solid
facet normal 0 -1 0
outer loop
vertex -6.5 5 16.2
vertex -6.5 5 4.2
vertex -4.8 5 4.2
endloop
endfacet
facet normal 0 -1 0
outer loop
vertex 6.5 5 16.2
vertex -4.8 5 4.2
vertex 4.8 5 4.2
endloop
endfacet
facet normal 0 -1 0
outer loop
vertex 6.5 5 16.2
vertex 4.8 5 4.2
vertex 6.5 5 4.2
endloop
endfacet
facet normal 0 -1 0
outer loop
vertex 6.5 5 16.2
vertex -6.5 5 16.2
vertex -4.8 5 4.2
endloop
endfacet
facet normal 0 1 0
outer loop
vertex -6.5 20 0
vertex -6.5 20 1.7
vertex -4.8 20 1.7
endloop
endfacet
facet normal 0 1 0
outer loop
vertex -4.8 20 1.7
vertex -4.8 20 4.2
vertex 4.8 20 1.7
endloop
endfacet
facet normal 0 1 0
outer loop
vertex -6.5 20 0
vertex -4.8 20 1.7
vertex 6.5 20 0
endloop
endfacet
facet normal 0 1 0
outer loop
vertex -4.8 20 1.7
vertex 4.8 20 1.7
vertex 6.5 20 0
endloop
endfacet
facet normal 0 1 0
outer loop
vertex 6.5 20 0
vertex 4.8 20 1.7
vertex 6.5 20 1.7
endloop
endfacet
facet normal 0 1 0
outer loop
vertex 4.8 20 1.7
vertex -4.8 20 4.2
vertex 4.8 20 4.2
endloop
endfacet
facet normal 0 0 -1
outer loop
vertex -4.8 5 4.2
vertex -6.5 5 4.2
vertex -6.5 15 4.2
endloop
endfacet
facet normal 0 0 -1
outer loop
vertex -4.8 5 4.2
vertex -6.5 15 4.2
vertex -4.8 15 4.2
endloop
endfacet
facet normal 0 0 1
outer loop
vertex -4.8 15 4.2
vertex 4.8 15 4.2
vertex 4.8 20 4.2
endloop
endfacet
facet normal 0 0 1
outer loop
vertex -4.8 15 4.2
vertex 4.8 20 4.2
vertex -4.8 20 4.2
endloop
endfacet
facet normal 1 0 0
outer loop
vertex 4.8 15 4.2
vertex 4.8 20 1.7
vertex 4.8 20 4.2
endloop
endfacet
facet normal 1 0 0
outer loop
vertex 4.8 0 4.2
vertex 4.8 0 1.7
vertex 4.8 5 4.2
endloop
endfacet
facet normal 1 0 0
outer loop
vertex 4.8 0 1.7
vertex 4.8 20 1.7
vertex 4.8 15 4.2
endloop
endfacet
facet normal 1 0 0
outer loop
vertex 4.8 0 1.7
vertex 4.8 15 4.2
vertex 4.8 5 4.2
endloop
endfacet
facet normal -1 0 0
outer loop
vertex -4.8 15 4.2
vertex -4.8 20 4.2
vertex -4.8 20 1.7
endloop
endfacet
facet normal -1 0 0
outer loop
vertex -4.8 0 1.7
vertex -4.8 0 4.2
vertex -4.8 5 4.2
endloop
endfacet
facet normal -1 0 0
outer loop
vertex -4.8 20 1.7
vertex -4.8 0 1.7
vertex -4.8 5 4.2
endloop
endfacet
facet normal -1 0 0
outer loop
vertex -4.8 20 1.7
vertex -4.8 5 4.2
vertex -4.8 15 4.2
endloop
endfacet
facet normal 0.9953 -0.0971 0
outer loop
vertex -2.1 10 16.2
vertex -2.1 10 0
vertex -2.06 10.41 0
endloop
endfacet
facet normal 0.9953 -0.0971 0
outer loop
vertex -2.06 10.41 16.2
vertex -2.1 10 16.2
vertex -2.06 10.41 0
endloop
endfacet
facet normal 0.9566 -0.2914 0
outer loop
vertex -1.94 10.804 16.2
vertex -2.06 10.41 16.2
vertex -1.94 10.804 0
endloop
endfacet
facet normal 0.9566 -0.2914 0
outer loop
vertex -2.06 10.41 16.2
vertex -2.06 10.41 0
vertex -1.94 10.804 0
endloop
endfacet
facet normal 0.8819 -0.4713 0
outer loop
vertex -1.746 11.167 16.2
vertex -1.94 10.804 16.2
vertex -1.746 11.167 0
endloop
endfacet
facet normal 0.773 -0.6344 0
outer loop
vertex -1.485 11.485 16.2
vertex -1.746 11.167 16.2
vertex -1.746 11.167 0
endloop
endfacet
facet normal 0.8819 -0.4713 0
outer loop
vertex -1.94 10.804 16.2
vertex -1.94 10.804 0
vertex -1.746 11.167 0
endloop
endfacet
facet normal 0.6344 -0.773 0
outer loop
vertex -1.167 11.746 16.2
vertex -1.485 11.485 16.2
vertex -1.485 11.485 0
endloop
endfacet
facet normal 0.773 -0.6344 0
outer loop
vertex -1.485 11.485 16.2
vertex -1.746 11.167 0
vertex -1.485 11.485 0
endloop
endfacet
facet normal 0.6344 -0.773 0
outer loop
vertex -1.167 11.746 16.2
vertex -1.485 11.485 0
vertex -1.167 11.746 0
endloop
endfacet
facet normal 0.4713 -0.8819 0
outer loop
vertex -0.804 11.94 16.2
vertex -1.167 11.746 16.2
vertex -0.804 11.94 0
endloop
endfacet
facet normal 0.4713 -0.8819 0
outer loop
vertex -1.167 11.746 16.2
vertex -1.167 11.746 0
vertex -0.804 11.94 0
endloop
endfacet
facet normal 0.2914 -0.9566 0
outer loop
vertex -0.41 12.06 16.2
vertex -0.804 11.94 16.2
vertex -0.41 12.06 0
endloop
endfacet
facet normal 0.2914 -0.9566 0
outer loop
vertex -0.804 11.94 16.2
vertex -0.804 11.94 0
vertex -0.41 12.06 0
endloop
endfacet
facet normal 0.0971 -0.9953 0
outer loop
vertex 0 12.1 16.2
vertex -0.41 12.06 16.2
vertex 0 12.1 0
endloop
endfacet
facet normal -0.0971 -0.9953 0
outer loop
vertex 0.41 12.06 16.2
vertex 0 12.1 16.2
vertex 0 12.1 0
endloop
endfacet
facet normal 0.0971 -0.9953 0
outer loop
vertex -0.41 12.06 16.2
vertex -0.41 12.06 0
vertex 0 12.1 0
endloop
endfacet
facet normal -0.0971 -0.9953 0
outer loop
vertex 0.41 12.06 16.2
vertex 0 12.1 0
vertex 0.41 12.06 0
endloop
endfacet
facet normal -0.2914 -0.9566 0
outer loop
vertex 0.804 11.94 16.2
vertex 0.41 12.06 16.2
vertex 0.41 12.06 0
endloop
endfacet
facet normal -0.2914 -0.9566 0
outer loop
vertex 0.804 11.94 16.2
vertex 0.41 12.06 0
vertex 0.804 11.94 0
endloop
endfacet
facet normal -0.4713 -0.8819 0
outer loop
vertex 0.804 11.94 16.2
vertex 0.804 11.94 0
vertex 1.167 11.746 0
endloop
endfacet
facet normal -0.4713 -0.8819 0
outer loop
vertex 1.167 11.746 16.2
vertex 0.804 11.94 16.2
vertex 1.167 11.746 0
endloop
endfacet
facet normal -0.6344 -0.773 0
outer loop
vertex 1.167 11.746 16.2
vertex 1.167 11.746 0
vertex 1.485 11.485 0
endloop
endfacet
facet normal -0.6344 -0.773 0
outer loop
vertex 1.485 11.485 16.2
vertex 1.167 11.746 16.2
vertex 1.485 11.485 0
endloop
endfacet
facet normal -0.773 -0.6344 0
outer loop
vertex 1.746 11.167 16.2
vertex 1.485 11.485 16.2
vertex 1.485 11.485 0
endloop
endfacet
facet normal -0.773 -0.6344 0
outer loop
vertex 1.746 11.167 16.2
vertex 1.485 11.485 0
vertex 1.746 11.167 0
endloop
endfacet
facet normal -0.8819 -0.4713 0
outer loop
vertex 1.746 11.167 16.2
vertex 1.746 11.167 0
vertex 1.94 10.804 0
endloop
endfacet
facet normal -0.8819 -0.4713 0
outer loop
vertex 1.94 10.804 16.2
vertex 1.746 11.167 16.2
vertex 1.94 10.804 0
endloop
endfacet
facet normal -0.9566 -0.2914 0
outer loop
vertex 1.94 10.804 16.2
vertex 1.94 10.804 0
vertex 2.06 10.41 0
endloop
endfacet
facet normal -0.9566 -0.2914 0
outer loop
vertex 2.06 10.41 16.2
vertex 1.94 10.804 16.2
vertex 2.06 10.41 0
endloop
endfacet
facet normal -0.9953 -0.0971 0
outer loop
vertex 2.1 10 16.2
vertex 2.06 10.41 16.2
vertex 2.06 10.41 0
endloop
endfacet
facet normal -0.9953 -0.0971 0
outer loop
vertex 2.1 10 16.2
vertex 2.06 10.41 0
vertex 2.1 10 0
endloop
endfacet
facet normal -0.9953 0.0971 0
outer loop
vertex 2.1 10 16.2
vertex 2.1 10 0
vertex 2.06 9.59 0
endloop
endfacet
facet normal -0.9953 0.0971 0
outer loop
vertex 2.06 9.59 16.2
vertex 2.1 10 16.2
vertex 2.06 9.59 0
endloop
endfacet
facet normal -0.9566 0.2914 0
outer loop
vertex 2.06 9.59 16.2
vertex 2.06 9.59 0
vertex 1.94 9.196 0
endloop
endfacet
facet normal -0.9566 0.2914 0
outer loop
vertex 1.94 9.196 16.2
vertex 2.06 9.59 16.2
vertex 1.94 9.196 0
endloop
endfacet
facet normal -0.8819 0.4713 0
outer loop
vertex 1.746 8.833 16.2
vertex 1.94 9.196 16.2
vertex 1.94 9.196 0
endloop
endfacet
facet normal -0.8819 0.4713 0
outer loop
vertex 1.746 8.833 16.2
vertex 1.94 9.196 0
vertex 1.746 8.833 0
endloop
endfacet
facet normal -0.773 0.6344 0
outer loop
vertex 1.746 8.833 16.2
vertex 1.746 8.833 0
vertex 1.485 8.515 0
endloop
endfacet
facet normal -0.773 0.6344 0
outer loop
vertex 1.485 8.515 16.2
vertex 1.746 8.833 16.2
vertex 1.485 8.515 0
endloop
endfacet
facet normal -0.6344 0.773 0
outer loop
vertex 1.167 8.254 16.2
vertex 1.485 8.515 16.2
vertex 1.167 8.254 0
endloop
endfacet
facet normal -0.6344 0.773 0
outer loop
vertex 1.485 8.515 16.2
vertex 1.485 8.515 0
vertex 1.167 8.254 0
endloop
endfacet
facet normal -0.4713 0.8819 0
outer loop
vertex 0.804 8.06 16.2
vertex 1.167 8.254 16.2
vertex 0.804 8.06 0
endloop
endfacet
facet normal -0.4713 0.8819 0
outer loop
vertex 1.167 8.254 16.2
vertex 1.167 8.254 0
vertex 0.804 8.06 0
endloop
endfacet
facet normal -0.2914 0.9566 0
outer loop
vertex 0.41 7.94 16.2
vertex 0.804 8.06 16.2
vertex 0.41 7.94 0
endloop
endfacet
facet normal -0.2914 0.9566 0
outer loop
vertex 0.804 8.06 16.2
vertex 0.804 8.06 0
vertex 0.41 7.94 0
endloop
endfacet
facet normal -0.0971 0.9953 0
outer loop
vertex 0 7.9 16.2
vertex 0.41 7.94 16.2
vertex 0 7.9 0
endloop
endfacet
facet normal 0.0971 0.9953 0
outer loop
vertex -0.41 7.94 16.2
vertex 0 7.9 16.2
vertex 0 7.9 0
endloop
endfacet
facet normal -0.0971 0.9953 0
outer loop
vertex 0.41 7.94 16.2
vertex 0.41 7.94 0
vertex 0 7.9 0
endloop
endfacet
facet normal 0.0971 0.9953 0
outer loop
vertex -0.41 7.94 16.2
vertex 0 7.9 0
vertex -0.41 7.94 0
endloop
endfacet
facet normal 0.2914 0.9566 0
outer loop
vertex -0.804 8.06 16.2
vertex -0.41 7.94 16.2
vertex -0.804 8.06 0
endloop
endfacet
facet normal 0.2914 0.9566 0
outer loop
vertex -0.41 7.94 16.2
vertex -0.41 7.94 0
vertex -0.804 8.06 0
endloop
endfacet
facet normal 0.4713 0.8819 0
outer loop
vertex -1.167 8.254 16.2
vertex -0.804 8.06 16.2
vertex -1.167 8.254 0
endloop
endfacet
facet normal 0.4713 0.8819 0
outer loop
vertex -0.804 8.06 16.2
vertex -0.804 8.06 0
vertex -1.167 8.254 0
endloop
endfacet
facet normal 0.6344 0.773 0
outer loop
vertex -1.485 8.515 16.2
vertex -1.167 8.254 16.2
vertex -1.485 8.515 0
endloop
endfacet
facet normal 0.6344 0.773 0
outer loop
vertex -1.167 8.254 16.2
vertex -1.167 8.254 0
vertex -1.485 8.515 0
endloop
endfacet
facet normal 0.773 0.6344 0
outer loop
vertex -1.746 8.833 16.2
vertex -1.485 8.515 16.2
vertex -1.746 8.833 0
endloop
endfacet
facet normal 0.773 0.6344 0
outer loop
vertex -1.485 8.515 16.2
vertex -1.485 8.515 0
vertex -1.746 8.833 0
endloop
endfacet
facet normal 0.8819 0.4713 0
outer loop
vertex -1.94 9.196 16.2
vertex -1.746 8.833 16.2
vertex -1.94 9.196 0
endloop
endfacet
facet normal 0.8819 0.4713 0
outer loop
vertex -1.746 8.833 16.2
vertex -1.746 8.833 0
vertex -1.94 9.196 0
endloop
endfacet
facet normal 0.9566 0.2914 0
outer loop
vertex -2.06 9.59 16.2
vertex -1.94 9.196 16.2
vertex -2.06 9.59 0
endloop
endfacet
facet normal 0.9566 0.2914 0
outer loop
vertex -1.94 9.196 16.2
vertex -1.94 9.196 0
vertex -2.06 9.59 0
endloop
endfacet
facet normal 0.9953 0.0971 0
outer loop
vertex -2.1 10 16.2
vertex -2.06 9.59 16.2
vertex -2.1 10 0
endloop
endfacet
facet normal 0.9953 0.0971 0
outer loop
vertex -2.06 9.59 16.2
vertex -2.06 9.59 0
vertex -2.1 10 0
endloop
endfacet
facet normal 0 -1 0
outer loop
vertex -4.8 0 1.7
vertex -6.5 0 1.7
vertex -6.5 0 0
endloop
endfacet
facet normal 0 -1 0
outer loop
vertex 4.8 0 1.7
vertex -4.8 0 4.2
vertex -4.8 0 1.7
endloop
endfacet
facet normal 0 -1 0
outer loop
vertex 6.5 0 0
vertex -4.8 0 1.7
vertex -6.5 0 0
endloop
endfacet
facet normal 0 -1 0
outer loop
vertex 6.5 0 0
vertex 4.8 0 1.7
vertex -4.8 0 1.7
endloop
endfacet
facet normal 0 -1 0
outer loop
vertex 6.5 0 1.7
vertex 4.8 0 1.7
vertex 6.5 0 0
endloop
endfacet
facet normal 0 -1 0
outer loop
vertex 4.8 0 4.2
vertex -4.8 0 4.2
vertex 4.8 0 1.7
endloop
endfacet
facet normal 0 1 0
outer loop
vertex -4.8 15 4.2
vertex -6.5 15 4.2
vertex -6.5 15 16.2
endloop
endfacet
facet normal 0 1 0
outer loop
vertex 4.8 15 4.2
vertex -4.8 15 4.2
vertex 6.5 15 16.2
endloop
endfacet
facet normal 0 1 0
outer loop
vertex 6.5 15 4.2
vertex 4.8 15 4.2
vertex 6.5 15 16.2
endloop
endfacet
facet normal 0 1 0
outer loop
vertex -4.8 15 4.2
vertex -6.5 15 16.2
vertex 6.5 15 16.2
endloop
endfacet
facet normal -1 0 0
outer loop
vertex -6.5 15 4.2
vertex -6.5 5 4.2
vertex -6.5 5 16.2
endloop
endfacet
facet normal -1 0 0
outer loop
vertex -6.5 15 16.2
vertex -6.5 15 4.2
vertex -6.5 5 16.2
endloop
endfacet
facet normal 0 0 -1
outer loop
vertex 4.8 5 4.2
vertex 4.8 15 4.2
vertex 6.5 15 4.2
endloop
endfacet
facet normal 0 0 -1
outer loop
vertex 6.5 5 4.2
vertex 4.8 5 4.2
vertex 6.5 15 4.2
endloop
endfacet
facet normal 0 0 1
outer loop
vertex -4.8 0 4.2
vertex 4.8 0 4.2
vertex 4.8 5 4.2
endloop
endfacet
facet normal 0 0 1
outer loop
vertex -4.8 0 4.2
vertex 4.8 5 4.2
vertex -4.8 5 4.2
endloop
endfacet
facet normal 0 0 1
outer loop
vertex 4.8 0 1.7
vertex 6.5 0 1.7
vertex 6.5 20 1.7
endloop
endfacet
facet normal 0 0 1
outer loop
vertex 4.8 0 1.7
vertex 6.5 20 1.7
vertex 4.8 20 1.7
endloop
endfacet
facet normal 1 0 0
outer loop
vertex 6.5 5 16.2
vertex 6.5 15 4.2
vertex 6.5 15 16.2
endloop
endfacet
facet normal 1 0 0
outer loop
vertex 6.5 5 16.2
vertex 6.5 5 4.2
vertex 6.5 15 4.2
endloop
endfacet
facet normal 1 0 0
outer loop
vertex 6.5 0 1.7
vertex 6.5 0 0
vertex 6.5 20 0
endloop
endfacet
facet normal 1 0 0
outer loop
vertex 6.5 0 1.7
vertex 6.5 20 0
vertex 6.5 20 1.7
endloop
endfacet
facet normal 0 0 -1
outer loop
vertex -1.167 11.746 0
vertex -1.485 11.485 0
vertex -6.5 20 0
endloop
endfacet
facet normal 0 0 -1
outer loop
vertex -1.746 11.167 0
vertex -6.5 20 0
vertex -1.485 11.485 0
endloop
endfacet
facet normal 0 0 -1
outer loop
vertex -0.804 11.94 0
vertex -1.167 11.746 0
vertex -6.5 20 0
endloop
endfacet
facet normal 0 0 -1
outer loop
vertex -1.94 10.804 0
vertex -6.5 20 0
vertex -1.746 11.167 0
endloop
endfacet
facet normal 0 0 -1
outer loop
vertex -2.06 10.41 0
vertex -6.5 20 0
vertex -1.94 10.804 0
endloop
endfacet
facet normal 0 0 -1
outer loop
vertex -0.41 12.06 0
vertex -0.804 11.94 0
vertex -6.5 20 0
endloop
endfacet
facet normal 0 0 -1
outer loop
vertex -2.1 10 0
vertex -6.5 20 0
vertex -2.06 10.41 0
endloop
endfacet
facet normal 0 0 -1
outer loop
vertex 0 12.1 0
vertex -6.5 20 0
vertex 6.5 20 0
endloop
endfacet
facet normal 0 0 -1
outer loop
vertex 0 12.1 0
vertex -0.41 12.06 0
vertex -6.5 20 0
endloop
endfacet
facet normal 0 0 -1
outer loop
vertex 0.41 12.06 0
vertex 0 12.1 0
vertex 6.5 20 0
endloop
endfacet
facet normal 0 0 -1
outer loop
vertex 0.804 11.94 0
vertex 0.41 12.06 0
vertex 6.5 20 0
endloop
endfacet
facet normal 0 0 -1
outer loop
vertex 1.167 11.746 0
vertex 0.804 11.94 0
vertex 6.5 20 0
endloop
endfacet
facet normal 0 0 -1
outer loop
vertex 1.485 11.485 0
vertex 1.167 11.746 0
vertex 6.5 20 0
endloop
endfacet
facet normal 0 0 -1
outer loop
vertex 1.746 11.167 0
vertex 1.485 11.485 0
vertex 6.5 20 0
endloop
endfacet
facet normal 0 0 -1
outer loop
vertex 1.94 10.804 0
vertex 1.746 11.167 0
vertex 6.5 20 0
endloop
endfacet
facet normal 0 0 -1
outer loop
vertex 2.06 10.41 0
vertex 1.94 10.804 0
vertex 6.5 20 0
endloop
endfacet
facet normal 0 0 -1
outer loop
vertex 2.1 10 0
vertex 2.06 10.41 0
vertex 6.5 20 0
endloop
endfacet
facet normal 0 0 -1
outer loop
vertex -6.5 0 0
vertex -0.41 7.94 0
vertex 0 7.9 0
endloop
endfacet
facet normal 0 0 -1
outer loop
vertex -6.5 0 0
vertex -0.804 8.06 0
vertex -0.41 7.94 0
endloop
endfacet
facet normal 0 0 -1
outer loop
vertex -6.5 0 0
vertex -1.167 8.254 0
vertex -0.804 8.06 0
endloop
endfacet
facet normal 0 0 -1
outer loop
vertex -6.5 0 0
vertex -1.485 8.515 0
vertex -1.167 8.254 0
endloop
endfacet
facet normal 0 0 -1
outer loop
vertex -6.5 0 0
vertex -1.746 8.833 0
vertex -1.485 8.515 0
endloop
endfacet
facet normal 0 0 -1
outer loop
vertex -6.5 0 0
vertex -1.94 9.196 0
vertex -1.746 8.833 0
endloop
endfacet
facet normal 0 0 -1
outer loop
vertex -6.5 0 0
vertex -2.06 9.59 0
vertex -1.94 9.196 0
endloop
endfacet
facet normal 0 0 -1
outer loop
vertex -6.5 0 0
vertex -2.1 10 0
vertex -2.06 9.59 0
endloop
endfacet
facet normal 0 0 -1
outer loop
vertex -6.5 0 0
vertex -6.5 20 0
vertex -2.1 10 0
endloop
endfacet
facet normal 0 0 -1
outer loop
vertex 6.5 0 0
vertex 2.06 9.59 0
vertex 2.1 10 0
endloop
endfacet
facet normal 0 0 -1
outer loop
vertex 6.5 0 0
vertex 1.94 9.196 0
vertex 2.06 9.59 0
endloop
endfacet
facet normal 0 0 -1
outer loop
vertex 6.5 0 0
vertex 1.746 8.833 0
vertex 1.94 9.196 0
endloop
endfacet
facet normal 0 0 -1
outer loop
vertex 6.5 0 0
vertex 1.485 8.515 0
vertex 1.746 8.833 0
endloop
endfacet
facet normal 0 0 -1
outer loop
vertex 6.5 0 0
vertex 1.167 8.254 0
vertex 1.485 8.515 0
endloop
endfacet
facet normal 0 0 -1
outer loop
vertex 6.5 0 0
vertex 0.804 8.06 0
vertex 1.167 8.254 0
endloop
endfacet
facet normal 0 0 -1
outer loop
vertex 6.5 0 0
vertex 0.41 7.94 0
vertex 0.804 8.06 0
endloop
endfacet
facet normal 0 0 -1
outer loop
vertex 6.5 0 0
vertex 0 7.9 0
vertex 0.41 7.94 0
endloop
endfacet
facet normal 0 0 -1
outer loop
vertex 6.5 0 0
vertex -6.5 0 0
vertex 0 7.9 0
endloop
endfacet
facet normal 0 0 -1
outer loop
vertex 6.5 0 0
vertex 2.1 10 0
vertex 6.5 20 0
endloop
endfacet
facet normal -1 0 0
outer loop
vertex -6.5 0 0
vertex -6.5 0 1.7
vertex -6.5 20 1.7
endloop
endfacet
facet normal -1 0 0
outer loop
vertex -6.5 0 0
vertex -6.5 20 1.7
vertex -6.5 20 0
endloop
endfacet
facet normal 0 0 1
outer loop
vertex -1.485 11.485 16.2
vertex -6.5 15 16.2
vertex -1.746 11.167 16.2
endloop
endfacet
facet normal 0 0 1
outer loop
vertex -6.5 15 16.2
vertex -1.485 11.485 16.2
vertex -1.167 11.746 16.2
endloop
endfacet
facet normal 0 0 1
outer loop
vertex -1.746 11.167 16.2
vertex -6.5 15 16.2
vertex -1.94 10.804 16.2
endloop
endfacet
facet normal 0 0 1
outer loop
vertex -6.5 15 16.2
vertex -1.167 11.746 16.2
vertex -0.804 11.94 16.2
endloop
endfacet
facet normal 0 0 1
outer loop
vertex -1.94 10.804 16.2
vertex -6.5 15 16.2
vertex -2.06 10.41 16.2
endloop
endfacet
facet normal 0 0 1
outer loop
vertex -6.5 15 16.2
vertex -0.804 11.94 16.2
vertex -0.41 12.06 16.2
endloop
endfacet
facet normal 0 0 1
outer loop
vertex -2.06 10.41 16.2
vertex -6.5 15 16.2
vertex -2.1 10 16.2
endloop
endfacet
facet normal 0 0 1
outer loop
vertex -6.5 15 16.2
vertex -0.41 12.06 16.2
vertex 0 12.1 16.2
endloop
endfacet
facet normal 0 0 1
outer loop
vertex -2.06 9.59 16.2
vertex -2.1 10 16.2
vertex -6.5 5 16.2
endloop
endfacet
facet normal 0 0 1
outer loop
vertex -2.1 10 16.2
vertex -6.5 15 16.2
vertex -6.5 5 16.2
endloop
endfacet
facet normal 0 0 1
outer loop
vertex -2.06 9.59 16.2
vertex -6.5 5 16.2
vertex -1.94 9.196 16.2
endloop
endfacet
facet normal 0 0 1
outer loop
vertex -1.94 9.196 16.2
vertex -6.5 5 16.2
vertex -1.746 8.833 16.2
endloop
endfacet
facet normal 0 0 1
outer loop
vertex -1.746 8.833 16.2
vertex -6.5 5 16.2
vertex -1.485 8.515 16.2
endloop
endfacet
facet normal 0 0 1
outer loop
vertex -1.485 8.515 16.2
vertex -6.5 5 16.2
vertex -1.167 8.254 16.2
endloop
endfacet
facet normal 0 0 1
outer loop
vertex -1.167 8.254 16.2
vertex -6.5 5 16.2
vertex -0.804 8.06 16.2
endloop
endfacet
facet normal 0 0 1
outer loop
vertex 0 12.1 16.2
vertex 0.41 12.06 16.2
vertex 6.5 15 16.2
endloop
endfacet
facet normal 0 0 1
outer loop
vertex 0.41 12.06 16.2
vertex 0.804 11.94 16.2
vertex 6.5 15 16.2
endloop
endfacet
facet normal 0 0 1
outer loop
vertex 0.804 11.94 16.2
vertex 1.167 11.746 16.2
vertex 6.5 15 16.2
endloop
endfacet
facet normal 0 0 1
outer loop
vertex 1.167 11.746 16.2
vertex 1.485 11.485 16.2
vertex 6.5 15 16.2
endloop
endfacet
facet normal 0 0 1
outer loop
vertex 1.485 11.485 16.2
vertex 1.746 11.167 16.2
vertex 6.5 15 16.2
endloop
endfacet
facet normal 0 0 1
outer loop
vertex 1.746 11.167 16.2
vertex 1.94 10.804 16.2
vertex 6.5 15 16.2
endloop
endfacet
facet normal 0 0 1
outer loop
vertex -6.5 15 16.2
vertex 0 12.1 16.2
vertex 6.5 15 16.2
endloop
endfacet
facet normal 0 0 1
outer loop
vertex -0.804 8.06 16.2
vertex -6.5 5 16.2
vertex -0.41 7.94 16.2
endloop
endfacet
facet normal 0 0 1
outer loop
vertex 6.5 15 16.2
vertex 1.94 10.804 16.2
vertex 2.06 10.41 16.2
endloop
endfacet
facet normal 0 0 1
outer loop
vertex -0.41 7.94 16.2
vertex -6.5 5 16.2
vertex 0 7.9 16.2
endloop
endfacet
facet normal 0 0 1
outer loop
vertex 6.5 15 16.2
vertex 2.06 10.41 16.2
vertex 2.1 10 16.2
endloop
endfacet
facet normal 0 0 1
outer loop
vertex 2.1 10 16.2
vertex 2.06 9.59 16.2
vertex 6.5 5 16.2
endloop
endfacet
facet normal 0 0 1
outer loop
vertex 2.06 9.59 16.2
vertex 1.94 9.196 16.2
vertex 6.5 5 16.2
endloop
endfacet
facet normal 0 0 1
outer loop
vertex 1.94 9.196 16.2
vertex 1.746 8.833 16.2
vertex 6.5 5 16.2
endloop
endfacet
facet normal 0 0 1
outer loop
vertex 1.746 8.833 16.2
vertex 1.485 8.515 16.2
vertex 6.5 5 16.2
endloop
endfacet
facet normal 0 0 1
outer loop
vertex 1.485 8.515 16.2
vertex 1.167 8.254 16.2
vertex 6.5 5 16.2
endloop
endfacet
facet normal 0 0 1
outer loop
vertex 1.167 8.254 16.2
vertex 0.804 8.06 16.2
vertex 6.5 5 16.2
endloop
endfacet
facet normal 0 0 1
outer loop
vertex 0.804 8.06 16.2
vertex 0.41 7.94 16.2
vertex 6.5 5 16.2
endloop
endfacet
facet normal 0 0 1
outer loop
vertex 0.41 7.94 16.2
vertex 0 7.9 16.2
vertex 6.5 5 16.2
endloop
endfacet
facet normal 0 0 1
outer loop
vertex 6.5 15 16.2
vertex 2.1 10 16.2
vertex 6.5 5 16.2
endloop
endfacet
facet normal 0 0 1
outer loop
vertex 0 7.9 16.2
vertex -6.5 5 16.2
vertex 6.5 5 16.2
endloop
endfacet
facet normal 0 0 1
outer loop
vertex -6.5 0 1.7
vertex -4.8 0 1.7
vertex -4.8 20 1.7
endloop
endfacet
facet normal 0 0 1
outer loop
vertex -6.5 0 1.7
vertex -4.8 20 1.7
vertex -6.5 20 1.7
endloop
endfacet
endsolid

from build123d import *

# Parameters (mm, degrees)
F1_DEPTH      = 20
F3_W          = 13
F3_H          = 12
F4_DEPTH      = 5
F4_DEPTH_BACK = 5
F6_D          = 4.2
F6_DEPTH      = 22.4
F6_TIP        = 1.2618073


with BuildPart() as f1:
    # F0 (on Front) → F1 (new body)
    with BuildSketch(Plane.XZ):
        Polygon((-6.5, 0), (0, 0), (6.5, 0), (6.5, 1.7), (4.8, 1.7), (4.8, 4.2), (0, 4.2), (-4.8, 4.2), (-4.8, 1.7), (-6.5, 1.7), align=None)
    extrude(amount=-F1_DEPTH)

    # F3 (on offset) → F4 (join, two sides)
    with BuildSketch(Plane.XZ.offset(-10)) as f4_sk:
        with Locations((0, 10.2)):
            Rectangle(F3_W, F3_H)
    extrude(amount=F4_DEPTH)
    extrude(f4_sk.sketch, amount=-F4_DEPTH_BACK)

    # F6
    with Locations(Plane.XY.offset(16.2)):
        with Locations((0, 10)):
            Hole(F6_D / 2, depth=F6_DEPTH)
            with Locations((0, 0, -(F6_DEPTH + F6_TIP / 2))):  # 118° drill point
                Cone(0, F6_D / 2, F6_TIP, mode=Mode.SUBTRACT)


solid = f1.part
